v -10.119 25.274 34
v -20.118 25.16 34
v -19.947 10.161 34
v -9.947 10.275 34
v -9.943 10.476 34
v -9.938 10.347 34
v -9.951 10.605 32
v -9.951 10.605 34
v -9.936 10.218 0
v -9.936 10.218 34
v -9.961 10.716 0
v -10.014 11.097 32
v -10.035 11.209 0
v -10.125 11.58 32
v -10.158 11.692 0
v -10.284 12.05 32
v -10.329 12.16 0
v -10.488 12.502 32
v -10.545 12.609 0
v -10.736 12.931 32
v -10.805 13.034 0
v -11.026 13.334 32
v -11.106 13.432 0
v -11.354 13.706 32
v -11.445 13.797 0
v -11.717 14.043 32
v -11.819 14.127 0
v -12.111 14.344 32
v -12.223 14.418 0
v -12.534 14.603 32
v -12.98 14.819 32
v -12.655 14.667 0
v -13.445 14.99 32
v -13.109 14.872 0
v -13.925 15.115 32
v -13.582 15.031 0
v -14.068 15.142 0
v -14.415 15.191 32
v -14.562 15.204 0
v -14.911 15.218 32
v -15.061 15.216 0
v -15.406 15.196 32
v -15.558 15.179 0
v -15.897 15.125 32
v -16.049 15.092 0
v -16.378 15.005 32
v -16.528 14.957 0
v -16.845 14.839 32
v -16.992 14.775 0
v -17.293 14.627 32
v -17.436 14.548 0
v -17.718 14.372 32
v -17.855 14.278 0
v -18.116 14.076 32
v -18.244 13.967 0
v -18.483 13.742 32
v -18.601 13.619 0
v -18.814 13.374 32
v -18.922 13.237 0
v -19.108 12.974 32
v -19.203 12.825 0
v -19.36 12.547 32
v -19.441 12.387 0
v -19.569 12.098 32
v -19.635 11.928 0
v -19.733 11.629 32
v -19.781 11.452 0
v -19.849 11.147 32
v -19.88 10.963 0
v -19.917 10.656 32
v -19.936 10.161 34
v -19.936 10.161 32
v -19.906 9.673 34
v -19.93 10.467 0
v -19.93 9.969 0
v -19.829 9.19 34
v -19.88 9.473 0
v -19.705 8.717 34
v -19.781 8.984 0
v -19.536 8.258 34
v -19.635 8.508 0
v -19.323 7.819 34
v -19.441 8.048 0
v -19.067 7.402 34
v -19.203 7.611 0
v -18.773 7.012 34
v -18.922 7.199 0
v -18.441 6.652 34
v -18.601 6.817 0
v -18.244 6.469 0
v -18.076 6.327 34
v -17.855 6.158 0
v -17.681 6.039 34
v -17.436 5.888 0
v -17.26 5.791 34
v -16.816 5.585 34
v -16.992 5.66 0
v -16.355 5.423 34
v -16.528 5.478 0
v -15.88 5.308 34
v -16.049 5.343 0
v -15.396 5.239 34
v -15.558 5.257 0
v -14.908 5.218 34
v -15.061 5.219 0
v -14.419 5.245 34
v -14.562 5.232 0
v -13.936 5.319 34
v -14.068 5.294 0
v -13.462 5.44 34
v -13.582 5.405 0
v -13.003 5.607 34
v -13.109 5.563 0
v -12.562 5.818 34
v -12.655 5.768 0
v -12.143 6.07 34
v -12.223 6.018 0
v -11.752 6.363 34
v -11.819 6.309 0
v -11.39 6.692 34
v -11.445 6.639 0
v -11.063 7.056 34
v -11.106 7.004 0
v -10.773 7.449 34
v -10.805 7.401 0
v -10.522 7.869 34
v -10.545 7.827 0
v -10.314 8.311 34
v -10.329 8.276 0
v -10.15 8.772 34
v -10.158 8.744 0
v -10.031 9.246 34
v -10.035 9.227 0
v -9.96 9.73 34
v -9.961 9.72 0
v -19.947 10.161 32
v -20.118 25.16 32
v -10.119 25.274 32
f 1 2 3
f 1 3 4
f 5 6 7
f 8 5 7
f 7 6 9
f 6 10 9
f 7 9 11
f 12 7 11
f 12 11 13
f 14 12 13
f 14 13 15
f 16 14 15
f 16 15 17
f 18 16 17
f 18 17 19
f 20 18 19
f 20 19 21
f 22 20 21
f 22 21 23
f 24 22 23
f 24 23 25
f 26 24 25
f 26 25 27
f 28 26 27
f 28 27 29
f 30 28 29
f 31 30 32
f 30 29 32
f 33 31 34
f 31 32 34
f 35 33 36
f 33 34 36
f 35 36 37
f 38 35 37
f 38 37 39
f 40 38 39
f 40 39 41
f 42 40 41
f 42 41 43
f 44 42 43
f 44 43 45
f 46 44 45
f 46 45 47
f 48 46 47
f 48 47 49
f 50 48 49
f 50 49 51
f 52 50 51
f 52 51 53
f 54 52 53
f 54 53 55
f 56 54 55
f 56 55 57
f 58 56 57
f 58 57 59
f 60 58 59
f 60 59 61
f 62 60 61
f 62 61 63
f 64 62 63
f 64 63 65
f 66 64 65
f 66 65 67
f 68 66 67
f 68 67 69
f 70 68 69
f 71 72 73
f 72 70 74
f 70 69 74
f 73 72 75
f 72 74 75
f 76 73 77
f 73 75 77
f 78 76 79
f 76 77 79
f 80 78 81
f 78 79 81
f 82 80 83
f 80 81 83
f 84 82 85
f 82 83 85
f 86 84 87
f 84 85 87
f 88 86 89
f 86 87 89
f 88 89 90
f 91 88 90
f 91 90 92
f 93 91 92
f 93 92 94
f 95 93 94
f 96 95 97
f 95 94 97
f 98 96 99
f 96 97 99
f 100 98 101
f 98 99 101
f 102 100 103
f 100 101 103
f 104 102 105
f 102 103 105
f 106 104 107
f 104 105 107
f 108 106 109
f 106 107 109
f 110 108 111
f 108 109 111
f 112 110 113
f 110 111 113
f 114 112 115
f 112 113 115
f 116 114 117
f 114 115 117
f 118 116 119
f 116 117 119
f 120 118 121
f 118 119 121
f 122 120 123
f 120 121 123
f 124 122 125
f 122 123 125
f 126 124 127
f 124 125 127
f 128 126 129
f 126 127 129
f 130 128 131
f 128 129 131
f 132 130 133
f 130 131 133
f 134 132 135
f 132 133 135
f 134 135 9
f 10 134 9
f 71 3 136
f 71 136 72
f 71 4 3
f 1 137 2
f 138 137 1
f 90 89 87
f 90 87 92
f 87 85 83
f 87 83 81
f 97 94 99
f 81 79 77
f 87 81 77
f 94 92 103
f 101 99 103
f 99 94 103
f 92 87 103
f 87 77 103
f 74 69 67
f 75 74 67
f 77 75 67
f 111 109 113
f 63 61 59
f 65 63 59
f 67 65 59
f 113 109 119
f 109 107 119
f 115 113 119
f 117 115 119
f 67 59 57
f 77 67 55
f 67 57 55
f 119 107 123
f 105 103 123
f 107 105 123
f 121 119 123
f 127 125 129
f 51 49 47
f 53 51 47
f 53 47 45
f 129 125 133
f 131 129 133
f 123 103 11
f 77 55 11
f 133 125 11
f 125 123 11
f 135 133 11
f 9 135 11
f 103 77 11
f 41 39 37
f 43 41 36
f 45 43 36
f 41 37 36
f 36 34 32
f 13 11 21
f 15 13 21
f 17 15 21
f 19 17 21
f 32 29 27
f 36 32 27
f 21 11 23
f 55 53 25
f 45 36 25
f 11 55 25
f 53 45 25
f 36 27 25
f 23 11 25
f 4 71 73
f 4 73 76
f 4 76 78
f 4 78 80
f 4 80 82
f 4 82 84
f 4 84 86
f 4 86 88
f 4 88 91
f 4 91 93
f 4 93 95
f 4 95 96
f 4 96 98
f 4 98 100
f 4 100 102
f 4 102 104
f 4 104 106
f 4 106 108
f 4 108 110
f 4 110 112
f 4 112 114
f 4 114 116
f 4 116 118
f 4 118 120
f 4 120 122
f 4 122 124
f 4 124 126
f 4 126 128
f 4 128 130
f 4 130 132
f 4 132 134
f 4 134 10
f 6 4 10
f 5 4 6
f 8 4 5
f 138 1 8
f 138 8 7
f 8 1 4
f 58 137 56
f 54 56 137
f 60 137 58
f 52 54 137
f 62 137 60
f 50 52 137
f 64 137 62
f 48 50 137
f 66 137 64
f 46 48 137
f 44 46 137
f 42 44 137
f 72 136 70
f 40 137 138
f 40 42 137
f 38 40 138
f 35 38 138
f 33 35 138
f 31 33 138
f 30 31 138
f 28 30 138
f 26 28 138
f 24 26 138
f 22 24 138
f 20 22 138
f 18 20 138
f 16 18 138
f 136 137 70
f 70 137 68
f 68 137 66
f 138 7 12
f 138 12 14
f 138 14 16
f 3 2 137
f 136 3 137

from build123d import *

# Parameters (mm, degrees)
SKETCH1_R           = 5
BOSS_EXTRUDE1_DEPTH = 34
SKETCH3_W           = 10
SKETCH3_H           = 2
BOSS_EXTRUDE2_DEPTH = 15


with BuildPart() as part:
    # Sketch1 → Boss-Extrude1 (new body)
    with BuildSketch(Plane.XY):
        with Locations((-14.936060675, 10.217847077)):
            Circle(SKETCH1_R)
    extrude(amount=BOSS_EXTRUDE1_DEPTH)

    # Sketch3 → Boss-Extrude2 (add)
    with BuildSketch(Plane(origin=(-0.118548513, 10.386962355, 0), x_dir=(0.9999348757579138, 0.011412459989218575, 0), z_dir=(-0.011412459989218575, 0.999934875757914, 0))):
        with Locations((-14.829416568, -33.000036039)):
            Rectangle(SKETCH3_W, SKETCH3_H)
    extrude(amount=BOSS_EXTRUDE2_DEPTH)


solid = part.part
